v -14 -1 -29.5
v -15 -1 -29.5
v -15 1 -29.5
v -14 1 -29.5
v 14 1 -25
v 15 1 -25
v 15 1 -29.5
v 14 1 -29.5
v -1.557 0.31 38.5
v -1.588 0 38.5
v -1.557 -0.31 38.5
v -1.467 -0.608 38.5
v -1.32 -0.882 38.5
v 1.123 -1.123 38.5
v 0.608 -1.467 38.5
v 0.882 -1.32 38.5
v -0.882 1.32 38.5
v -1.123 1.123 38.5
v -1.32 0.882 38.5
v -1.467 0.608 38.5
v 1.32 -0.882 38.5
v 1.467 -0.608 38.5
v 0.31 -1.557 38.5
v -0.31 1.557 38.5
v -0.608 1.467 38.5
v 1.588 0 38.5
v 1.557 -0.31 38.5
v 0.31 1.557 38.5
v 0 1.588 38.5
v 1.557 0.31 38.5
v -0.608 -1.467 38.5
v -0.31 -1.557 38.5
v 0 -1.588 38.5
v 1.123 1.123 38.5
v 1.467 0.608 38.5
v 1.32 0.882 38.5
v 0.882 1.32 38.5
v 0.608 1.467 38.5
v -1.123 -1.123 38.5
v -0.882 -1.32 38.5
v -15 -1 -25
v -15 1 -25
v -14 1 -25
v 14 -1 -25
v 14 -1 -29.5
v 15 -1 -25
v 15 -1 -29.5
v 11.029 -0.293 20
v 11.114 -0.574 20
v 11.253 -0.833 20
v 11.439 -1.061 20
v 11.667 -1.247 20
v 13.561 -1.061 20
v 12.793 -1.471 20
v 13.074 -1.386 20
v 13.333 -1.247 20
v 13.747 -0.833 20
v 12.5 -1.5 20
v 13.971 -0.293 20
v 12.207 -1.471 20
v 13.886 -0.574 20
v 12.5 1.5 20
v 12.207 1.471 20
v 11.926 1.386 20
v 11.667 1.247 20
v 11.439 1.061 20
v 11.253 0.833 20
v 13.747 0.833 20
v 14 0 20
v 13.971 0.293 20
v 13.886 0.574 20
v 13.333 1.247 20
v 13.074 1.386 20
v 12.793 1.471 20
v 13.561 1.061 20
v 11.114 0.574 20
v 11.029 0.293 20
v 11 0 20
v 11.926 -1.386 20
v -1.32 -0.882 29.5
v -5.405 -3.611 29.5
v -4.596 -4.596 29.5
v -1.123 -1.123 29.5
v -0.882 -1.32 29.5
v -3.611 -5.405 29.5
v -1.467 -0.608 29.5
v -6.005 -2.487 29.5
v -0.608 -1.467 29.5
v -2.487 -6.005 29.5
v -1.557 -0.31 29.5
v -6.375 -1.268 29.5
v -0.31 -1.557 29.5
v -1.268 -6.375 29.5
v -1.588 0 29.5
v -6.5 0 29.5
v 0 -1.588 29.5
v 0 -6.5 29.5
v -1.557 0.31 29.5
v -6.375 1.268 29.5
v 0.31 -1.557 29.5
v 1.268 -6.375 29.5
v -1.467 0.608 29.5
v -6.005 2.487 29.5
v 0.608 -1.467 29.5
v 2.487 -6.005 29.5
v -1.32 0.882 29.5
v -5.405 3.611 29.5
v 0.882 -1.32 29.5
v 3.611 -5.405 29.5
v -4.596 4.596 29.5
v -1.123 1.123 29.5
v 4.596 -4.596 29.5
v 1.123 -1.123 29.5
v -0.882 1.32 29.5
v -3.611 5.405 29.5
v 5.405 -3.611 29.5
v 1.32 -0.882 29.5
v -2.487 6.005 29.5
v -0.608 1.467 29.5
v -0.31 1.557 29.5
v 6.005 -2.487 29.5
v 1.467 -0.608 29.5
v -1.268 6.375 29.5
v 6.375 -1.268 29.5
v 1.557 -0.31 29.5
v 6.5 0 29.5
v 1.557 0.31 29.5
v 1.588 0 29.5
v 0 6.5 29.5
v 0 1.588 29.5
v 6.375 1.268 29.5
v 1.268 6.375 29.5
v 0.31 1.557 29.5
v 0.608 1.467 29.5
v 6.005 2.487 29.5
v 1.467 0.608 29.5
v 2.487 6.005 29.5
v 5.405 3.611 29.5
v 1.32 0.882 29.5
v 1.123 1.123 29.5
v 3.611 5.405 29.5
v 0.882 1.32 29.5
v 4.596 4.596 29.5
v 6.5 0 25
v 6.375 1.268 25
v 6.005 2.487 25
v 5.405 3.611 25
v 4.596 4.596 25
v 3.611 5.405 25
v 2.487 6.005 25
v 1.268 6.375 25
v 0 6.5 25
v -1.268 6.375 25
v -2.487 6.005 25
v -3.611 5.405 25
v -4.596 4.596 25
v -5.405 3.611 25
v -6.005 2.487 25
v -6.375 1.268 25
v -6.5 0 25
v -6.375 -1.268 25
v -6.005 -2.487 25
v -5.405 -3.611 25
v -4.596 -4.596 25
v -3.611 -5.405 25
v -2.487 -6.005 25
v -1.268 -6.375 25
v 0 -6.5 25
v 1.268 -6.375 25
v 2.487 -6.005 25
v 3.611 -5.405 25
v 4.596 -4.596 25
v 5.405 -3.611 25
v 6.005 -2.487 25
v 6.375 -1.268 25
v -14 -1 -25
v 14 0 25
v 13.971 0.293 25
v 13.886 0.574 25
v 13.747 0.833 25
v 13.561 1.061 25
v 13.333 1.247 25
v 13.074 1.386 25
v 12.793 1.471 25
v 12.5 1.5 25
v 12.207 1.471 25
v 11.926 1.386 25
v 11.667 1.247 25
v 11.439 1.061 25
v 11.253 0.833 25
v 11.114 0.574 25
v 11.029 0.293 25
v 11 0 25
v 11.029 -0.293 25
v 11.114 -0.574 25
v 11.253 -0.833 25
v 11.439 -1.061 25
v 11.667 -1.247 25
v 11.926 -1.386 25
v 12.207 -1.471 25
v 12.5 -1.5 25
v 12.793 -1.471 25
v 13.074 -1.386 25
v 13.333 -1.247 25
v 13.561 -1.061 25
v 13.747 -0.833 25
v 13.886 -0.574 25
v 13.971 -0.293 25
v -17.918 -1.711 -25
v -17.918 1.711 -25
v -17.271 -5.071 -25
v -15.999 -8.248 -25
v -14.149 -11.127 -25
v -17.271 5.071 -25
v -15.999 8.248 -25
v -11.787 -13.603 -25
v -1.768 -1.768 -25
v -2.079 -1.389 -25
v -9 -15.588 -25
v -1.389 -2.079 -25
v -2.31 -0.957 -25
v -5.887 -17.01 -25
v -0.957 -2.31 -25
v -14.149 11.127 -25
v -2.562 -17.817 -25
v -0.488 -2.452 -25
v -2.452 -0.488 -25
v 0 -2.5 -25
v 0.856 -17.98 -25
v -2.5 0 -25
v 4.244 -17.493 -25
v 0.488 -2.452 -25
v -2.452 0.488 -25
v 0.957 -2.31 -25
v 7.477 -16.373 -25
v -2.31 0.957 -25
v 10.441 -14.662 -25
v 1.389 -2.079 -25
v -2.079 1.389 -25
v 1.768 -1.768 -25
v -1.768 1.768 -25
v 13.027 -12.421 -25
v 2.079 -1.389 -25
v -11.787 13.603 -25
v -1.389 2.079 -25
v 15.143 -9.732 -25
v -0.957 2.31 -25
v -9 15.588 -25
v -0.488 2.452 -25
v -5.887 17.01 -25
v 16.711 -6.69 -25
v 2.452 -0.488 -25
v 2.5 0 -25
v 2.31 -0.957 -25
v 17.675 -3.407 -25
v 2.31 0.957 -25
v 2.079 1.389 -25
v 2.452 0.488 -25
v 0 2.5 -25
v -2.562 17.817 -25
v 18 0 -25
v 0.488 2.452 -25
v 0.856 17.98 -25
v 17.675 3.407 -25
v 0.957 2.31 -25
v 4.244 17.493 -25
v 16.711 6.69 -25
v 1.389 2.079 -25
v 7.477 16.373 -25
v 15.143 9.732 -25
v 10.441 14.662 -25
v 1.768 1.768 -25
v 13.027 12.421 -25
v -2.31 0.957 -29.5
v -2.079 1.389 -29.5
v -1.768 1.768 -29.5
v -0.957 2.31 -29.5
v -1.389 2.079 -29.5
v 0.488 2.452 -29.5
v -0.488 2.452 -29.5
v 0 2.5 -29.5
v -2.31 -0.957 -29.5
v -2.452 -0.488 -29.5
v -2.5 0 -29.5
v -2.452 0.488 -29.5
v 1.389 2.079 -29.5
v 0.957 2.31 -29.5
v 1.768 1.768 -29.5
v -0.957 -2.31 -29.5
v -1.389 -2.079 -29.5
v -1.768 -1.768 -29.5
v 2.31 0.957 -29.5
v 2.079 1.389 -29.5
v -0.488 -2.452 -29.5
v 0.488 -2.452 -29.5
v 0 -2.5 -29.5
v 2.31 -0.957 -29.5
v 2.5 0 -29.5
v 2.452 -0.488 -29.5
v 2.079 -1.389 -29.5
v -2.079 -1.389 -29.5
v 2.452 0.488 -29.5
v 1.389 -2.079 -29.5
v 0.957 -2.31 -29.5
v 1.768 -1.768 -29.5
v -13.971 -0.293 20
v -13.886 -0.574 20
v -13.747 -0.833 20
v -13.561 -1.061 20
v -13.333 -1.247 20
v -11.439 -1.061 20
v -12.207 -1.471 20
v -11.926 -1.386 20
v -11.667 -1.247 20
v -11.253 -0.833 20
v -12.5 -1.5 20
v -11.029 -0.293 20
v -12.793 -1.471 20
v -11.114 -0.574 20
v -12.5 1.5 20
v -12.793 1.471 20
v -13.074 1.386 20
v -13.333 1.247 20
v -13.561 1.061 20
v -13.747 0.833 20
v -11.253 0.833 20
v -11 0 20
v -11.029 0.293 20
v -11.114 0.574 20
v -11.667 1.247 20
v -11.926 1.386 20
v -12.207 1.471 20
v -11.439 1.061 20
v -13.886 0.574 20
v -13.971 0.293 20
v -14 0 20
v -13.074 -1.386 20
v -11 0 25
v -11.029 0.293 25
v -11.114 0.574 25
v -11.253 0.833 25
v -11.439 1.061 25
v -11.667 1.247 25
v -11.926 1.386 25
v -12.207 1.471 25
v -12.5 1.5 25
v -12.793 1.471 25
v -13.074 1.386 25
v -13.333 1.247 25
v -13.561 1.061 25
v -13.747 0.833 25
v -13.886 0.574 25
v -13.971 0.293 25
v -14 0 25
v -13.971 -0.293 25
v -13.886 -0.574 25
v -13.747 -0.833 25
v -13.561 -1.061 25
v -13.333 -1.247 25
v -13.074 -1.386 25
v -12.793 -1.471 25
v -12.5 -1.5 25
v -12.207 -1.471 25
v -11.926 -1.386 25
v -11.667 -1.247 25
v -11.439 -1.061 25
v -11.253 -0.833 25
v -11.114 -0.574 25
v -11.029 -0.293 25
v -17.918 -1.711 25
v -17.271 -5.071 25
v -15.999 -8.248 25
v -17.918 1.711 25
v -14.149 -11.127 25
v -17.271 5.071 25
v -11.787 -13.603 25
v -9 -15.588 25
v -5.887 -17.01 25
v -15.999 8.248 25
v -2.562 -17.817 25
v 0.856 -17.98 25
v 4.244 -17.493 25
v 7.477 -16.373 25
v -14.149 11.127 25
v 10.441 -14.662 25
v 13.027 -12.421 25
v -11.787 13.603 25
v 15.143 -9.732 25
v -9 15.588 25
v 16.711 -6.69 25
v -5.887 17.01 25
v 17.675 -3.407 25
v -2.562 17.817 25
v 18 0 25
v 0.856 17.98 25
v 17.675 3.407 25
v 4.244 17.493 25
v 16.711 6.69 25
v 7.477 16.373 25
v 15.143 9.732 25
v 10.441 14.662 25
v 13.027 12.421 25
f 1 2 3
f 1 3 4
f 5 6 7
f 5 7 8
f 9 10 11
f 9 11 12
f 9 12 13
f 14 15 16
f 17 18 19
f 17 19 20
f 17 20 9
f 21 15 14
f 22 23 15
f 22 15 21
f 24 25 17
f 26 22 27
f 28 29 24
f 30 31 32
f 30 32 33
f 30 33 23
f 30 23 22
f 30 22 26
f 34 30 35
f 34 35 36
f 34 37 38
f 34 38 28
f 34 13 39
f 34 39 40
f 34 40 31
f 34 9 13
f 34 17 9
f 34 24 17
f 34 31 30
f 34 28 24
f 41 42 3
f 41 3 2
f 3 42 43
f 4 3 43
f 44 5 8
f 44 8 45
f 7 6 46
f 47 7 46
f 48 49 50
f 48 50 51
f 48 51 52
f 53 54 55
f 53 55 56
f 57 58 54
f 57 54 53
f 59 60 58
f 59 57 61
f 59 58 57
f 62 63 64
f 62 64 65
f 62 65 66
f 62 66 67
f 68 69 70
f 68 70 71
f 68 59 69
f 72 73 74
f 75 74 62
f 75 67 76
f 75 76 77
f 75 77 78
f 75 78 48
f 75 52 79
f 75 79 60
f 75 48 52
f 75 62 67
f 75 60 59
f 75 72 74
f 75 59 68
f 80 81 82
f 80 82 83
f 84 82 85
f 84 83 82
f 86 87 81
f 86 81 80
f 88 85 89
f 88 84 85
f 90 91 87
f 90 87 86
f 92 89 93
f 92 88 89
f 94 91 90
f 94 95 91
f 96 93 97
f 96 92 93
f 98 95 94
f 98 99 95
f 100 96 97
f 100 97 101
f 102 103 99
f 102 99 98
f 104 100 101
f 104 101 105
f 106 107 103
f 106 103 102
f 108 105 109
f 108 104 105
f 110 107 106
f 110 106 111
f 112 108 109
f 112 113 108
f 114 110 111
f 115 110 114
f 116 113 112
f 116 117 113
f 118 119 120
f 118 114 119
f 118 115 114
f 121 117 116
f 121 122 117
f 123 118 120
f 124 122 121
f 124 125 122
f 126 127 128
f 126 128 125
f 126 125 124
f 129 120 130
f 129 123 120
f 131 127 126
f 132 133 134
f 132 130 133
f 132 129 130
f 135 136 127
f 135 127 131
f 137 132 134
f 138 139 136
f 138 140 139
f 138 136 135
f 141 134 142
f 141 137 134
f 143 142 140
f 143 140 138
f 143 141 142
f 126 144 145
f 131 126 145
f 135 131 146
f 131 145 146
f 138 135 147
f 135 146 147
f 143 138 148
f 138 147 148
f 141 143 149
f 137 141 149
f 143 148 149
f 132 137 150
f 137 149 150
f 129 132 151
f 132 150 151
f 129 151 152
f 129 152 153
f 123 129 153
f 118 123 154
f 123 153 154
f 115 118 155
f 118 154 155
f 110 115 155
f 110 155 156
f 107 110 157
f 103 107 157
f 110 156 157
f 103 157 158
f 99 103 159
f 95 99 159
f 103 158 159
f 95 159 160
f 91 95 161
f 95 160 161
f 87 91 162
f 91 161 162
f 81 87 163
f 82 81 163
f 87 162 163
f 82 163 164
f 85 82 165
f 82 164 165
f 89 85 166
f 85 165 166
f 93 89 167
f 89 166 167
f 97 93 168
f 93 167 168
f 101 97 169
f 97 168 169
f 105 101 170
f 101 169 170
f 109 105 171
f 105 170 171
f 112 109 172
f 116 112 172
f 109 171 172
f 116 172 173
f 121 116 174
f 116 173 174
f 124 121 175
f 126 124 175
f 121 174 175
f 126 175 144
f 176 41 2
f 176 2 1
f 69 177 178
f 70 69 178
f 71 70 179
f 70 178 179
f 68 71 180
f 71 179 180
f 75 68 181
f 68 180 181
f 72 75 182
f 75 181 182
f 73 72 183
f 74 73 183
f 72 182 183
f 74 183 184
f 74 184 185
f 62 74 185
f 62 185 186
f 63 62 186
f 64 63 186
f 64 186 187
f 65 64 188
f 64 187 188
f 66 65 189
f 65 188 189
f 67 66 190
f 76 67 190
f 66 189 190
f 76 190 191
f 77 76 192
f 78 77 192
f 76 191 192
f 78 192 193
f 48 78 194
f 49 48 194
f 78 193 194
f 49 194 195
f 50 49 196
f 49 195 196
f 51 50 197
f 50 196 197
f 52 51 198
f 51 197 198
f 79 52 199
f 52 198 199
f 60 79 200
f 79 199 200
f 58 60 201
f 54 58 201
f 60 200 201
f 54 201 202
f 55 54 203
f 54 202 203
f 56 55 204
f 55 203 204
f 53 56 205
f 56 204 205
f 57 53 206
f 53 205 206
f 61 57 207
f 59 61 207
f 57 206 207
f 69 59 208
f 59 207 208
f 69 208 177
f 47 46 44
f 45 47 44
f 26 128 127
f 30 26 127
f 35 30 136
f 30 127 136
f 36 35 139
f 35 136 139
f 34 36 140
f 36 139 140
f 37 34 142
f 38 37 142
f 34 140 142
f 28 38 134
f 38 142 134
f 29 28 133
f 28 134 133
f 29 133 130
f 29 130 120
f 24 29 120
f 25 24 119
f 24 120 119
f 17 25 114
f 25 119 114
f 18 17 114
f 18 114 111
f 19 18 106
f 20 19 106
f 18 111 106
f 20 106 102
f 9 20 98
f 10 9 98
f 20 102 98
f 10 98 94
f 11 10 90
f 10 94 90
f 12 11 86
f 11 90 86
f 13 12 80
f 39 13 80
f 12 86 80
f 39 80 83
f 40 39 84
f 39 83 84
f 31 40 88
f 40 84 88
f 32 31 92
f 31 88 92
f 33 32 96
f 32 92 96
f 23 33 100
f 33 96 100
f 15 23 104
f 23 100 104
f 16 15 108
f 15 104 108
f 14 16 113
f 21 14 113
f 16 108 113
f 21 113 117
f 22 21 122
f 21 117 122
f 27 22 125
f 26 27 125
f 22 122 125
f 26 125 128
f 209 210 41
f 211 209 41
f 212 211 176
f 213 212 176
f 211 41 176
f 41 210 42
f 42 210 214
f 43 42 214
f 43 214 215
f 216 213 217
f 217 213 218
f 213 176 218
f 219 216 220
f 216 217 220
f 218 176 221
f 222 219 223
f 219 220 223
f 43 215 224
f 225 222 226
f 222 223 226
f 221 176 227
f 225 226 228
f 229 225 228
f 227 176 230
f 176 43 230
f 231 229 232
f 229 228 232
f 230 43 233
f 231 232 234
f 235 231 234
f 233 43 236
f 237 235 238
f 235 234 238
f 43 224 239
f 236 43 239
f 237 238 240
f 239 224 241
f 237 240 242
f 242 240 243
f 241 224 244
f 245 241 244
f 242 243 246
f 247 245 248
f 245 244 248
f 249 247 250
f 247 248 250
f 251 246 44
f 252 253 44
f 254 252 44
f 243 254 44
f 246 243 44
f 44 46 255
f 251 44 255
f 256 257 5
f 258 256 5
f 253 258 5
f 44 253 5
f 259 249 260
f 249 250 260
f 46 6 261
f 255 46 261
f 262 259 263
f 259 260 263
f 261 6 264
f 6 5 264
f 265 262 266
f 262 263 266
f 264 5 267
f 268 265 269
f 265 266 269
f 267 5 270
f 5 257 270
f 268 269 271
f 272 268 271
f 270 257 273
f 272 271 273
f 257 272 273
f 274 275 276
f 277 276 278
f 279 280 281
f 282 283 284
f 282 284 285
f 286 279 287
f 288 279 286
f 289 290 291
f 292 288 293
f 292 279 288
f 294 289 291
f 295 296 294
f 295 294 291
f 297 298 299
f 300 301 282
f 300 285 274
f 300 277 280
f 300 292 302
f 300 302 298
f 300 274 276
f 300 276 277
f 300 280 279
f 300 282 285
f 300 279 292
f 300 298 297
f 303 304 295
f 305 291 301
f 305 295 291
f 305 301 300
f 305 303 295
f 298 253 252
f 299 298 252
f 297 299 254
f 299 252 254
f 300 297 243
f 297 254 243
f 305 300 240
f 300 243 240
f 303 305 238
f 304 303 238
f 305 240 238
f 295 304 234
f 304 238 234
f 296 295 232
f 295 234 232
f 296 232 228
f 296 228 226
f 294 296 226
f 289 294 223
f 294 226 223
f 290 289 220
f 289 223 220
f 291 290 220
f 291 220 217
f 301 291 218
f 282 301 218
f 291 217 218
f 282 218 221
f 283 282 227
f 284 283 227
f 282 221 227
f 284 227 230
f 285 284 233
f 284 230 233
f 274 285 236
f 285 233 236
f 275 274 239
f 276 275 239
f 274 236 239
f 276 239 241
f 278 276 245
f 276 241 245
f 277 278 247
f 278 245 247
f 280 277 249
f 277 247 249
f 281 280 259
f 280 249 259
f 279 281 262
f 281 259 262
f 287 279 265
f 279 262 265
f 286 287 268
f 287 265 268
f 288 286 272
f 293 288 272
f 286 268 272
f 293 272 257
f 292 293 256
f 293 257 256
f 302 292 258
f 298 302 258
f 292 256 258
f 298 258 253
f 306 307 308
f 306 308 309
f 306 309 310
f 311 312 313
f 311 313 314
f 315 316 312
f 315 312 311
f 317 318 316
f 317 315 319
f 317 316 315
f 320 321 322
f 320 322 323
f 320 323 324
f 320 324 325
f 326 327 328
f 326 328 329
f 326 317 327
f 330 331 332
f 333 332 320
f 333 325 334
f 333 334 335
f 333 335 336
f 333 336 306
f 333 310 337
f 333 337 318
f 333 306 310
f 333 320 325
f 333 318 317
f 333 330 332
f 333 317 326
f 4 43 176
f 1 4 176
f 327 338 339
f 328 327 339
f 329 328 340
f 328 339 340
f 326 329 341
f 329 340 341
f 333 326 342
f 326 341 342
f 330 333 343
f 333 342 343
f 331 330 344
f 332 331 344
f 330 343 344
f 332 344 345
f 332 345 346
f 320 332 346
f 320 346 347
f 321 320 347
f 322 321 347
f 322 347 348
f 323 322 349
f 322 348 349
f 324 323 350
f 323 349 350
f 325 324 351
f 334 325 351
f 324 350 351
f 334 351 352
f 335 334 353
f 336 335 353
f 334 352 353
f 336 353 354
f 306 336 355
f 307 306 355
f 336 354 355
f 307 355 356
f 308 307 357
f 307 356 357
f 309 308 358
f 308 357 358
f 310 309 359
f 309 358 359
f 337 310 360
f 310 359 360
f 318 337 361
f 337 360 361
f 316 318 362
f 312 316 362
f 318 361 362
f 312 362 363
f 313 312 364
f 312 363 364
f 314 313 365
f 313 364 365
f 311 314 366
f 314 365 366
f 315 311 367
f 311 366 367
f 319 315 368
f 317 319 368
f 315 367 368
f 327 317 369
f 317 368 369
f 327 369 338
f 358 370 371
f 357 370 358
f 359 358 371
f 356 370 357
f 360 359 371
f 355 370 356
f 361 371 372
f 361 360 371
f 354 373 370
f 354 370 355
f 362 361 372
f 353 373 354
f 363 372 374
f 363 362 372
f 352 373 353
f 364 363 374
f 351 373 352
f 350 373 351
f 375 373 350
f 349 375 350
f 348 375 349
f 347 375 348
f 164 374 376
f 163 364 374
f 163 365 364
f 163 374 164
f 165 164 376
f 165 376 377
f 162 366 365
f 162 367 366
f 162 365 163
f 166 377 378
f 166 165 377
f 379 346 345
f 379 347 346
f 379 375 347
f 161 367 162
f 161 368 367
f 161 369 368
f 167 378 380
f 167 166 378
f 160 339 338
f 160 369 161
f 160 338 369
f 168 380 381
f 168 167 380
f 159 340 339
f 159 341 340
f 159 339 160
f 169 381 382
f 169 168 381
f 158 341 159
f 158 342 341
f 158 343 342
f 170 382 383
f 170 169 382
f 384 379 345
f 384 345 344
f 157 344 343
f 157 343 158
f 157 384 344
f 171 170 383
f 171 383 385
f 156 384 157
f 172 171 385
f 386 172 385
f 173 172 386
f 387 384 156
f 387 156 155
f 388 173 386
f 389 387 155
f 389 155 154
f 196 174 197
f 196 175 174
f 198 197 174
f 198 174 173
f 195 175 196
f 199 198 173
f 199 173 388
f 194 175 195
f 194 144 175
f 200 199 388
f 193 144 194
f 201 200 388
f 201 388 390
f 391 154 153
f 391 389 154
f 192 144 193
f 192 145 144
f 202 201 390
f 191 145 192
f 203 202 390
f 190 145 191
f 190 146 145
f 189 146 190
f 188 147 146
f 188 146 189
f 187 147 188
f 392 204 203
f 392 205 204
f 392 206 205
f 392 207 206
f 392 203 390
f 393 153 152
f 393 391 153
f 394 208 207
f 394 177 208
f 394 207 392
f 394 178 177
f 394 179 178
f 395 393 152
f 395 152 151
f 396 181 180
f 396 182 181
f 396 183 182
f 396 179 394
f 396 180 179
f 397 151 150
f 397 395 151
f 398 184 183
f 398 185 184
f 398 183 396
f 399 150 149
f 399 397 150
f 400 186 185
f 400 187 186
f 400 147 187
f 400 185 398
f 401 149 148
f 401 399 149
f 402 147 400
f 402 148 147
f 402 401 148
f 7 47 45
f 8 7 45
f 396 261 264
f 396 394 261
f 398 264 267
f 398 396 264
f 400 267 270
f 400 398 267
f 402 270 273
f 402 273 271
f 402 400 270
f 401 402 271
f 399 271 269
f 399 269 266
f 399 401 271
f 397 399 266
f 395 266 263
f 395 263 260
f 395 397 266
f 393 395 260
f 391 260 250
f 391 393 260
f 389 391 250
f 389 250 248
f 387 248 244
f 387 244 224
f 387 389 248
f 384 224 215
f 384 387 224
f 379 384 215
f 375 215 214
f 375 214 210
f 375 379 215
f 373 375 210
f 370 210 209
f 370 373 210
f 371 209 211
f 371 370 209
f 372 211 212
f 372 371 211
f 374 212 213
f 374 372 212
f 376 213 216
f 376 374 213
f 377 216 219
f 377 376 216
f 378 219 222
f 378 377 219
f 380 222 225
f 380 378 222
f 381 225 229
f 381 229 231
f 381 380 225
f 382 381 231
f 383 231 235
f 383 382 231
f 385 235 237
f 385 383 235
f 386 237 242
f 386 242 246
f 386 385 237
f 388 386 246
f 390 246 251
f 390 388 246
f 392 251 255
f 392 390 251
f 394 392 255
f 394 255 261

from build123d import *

# Parameters (mm, degrees)
F0_R      = 18
F1_DEPTH  = 25
F2_R      = 6.5
F3_DEPTH  = 4.5
F4_R      = 1.5875
F5_DEPTH  = 9
F6_W      = 1
F6_H      = 2
F7_DEPTH  = 4.5
F8_R      = 1.5
F9_DEPTH  = 5
F10_R     = 2.5
F11_DEPTH = 4.5


# Not quite as in the source:
# - a pattern or mirror of a feature is missing from the dataset's text; its kind, count and spacing are read off the source's solid


with BuildPart() as f1:
    # F0 (on Top) → F1 (new body, symmetric)
    with BuildSketch(Plane.XY):
        Circle(F0_R)
    extrude(amount=F1_DEPTH, both=True)

    # F2 (on face) → F3 (join)
    with BuildSketch(Plane.XY.offset(25)):
        Circle(F2_R)
    extrude(amount=F3_DEPTH)

    # F4 (on face) → F5 (join)
    with BuildSketch(Plane.XY.offset(29.5)):
        Circle(F4_R)
    extrude(amount=F5_DEPTH)

    # F6 (on face) → F7 (join)
    with BuildSketch(Plane(origin=(0, 0, -25), x_dir=(1, 0, 0), z_dir=(0, 0, -1))):
        with Locations((-14.5, 0)):
            Rectangle(F6_W, F6_H)
    f7 = extrude(amount=F7_DEPTH)

    # F7_copies: F7 across plane
    add(f7.mirror(Plane(origin=(0, 0, 0), x_dir=(0, 0, 1), z_dir=(1, 0, 0))))

    # F8 (on face) → F9 (cut)
    with BuildSketch(Plane.XY.offset(25)):
        with Locations((12.5, 0)):
            Circle(F8_R)
        with Locations((-12.5, 0)):
            Circle(F8_R)
    extrude(amount=-F9_DEPTH, mode=Mode.SUBTRACT)

    # F10 (on face) → F11 (join)
    with BuildSketch(Plane(origin=(0, 0, -25), x_dir=(1, 0, 0), z_dir=(0, 0, -1))):
        Circle(F10_R)
    extrude(amount=F11_DEPTH)


solid = f1.part
